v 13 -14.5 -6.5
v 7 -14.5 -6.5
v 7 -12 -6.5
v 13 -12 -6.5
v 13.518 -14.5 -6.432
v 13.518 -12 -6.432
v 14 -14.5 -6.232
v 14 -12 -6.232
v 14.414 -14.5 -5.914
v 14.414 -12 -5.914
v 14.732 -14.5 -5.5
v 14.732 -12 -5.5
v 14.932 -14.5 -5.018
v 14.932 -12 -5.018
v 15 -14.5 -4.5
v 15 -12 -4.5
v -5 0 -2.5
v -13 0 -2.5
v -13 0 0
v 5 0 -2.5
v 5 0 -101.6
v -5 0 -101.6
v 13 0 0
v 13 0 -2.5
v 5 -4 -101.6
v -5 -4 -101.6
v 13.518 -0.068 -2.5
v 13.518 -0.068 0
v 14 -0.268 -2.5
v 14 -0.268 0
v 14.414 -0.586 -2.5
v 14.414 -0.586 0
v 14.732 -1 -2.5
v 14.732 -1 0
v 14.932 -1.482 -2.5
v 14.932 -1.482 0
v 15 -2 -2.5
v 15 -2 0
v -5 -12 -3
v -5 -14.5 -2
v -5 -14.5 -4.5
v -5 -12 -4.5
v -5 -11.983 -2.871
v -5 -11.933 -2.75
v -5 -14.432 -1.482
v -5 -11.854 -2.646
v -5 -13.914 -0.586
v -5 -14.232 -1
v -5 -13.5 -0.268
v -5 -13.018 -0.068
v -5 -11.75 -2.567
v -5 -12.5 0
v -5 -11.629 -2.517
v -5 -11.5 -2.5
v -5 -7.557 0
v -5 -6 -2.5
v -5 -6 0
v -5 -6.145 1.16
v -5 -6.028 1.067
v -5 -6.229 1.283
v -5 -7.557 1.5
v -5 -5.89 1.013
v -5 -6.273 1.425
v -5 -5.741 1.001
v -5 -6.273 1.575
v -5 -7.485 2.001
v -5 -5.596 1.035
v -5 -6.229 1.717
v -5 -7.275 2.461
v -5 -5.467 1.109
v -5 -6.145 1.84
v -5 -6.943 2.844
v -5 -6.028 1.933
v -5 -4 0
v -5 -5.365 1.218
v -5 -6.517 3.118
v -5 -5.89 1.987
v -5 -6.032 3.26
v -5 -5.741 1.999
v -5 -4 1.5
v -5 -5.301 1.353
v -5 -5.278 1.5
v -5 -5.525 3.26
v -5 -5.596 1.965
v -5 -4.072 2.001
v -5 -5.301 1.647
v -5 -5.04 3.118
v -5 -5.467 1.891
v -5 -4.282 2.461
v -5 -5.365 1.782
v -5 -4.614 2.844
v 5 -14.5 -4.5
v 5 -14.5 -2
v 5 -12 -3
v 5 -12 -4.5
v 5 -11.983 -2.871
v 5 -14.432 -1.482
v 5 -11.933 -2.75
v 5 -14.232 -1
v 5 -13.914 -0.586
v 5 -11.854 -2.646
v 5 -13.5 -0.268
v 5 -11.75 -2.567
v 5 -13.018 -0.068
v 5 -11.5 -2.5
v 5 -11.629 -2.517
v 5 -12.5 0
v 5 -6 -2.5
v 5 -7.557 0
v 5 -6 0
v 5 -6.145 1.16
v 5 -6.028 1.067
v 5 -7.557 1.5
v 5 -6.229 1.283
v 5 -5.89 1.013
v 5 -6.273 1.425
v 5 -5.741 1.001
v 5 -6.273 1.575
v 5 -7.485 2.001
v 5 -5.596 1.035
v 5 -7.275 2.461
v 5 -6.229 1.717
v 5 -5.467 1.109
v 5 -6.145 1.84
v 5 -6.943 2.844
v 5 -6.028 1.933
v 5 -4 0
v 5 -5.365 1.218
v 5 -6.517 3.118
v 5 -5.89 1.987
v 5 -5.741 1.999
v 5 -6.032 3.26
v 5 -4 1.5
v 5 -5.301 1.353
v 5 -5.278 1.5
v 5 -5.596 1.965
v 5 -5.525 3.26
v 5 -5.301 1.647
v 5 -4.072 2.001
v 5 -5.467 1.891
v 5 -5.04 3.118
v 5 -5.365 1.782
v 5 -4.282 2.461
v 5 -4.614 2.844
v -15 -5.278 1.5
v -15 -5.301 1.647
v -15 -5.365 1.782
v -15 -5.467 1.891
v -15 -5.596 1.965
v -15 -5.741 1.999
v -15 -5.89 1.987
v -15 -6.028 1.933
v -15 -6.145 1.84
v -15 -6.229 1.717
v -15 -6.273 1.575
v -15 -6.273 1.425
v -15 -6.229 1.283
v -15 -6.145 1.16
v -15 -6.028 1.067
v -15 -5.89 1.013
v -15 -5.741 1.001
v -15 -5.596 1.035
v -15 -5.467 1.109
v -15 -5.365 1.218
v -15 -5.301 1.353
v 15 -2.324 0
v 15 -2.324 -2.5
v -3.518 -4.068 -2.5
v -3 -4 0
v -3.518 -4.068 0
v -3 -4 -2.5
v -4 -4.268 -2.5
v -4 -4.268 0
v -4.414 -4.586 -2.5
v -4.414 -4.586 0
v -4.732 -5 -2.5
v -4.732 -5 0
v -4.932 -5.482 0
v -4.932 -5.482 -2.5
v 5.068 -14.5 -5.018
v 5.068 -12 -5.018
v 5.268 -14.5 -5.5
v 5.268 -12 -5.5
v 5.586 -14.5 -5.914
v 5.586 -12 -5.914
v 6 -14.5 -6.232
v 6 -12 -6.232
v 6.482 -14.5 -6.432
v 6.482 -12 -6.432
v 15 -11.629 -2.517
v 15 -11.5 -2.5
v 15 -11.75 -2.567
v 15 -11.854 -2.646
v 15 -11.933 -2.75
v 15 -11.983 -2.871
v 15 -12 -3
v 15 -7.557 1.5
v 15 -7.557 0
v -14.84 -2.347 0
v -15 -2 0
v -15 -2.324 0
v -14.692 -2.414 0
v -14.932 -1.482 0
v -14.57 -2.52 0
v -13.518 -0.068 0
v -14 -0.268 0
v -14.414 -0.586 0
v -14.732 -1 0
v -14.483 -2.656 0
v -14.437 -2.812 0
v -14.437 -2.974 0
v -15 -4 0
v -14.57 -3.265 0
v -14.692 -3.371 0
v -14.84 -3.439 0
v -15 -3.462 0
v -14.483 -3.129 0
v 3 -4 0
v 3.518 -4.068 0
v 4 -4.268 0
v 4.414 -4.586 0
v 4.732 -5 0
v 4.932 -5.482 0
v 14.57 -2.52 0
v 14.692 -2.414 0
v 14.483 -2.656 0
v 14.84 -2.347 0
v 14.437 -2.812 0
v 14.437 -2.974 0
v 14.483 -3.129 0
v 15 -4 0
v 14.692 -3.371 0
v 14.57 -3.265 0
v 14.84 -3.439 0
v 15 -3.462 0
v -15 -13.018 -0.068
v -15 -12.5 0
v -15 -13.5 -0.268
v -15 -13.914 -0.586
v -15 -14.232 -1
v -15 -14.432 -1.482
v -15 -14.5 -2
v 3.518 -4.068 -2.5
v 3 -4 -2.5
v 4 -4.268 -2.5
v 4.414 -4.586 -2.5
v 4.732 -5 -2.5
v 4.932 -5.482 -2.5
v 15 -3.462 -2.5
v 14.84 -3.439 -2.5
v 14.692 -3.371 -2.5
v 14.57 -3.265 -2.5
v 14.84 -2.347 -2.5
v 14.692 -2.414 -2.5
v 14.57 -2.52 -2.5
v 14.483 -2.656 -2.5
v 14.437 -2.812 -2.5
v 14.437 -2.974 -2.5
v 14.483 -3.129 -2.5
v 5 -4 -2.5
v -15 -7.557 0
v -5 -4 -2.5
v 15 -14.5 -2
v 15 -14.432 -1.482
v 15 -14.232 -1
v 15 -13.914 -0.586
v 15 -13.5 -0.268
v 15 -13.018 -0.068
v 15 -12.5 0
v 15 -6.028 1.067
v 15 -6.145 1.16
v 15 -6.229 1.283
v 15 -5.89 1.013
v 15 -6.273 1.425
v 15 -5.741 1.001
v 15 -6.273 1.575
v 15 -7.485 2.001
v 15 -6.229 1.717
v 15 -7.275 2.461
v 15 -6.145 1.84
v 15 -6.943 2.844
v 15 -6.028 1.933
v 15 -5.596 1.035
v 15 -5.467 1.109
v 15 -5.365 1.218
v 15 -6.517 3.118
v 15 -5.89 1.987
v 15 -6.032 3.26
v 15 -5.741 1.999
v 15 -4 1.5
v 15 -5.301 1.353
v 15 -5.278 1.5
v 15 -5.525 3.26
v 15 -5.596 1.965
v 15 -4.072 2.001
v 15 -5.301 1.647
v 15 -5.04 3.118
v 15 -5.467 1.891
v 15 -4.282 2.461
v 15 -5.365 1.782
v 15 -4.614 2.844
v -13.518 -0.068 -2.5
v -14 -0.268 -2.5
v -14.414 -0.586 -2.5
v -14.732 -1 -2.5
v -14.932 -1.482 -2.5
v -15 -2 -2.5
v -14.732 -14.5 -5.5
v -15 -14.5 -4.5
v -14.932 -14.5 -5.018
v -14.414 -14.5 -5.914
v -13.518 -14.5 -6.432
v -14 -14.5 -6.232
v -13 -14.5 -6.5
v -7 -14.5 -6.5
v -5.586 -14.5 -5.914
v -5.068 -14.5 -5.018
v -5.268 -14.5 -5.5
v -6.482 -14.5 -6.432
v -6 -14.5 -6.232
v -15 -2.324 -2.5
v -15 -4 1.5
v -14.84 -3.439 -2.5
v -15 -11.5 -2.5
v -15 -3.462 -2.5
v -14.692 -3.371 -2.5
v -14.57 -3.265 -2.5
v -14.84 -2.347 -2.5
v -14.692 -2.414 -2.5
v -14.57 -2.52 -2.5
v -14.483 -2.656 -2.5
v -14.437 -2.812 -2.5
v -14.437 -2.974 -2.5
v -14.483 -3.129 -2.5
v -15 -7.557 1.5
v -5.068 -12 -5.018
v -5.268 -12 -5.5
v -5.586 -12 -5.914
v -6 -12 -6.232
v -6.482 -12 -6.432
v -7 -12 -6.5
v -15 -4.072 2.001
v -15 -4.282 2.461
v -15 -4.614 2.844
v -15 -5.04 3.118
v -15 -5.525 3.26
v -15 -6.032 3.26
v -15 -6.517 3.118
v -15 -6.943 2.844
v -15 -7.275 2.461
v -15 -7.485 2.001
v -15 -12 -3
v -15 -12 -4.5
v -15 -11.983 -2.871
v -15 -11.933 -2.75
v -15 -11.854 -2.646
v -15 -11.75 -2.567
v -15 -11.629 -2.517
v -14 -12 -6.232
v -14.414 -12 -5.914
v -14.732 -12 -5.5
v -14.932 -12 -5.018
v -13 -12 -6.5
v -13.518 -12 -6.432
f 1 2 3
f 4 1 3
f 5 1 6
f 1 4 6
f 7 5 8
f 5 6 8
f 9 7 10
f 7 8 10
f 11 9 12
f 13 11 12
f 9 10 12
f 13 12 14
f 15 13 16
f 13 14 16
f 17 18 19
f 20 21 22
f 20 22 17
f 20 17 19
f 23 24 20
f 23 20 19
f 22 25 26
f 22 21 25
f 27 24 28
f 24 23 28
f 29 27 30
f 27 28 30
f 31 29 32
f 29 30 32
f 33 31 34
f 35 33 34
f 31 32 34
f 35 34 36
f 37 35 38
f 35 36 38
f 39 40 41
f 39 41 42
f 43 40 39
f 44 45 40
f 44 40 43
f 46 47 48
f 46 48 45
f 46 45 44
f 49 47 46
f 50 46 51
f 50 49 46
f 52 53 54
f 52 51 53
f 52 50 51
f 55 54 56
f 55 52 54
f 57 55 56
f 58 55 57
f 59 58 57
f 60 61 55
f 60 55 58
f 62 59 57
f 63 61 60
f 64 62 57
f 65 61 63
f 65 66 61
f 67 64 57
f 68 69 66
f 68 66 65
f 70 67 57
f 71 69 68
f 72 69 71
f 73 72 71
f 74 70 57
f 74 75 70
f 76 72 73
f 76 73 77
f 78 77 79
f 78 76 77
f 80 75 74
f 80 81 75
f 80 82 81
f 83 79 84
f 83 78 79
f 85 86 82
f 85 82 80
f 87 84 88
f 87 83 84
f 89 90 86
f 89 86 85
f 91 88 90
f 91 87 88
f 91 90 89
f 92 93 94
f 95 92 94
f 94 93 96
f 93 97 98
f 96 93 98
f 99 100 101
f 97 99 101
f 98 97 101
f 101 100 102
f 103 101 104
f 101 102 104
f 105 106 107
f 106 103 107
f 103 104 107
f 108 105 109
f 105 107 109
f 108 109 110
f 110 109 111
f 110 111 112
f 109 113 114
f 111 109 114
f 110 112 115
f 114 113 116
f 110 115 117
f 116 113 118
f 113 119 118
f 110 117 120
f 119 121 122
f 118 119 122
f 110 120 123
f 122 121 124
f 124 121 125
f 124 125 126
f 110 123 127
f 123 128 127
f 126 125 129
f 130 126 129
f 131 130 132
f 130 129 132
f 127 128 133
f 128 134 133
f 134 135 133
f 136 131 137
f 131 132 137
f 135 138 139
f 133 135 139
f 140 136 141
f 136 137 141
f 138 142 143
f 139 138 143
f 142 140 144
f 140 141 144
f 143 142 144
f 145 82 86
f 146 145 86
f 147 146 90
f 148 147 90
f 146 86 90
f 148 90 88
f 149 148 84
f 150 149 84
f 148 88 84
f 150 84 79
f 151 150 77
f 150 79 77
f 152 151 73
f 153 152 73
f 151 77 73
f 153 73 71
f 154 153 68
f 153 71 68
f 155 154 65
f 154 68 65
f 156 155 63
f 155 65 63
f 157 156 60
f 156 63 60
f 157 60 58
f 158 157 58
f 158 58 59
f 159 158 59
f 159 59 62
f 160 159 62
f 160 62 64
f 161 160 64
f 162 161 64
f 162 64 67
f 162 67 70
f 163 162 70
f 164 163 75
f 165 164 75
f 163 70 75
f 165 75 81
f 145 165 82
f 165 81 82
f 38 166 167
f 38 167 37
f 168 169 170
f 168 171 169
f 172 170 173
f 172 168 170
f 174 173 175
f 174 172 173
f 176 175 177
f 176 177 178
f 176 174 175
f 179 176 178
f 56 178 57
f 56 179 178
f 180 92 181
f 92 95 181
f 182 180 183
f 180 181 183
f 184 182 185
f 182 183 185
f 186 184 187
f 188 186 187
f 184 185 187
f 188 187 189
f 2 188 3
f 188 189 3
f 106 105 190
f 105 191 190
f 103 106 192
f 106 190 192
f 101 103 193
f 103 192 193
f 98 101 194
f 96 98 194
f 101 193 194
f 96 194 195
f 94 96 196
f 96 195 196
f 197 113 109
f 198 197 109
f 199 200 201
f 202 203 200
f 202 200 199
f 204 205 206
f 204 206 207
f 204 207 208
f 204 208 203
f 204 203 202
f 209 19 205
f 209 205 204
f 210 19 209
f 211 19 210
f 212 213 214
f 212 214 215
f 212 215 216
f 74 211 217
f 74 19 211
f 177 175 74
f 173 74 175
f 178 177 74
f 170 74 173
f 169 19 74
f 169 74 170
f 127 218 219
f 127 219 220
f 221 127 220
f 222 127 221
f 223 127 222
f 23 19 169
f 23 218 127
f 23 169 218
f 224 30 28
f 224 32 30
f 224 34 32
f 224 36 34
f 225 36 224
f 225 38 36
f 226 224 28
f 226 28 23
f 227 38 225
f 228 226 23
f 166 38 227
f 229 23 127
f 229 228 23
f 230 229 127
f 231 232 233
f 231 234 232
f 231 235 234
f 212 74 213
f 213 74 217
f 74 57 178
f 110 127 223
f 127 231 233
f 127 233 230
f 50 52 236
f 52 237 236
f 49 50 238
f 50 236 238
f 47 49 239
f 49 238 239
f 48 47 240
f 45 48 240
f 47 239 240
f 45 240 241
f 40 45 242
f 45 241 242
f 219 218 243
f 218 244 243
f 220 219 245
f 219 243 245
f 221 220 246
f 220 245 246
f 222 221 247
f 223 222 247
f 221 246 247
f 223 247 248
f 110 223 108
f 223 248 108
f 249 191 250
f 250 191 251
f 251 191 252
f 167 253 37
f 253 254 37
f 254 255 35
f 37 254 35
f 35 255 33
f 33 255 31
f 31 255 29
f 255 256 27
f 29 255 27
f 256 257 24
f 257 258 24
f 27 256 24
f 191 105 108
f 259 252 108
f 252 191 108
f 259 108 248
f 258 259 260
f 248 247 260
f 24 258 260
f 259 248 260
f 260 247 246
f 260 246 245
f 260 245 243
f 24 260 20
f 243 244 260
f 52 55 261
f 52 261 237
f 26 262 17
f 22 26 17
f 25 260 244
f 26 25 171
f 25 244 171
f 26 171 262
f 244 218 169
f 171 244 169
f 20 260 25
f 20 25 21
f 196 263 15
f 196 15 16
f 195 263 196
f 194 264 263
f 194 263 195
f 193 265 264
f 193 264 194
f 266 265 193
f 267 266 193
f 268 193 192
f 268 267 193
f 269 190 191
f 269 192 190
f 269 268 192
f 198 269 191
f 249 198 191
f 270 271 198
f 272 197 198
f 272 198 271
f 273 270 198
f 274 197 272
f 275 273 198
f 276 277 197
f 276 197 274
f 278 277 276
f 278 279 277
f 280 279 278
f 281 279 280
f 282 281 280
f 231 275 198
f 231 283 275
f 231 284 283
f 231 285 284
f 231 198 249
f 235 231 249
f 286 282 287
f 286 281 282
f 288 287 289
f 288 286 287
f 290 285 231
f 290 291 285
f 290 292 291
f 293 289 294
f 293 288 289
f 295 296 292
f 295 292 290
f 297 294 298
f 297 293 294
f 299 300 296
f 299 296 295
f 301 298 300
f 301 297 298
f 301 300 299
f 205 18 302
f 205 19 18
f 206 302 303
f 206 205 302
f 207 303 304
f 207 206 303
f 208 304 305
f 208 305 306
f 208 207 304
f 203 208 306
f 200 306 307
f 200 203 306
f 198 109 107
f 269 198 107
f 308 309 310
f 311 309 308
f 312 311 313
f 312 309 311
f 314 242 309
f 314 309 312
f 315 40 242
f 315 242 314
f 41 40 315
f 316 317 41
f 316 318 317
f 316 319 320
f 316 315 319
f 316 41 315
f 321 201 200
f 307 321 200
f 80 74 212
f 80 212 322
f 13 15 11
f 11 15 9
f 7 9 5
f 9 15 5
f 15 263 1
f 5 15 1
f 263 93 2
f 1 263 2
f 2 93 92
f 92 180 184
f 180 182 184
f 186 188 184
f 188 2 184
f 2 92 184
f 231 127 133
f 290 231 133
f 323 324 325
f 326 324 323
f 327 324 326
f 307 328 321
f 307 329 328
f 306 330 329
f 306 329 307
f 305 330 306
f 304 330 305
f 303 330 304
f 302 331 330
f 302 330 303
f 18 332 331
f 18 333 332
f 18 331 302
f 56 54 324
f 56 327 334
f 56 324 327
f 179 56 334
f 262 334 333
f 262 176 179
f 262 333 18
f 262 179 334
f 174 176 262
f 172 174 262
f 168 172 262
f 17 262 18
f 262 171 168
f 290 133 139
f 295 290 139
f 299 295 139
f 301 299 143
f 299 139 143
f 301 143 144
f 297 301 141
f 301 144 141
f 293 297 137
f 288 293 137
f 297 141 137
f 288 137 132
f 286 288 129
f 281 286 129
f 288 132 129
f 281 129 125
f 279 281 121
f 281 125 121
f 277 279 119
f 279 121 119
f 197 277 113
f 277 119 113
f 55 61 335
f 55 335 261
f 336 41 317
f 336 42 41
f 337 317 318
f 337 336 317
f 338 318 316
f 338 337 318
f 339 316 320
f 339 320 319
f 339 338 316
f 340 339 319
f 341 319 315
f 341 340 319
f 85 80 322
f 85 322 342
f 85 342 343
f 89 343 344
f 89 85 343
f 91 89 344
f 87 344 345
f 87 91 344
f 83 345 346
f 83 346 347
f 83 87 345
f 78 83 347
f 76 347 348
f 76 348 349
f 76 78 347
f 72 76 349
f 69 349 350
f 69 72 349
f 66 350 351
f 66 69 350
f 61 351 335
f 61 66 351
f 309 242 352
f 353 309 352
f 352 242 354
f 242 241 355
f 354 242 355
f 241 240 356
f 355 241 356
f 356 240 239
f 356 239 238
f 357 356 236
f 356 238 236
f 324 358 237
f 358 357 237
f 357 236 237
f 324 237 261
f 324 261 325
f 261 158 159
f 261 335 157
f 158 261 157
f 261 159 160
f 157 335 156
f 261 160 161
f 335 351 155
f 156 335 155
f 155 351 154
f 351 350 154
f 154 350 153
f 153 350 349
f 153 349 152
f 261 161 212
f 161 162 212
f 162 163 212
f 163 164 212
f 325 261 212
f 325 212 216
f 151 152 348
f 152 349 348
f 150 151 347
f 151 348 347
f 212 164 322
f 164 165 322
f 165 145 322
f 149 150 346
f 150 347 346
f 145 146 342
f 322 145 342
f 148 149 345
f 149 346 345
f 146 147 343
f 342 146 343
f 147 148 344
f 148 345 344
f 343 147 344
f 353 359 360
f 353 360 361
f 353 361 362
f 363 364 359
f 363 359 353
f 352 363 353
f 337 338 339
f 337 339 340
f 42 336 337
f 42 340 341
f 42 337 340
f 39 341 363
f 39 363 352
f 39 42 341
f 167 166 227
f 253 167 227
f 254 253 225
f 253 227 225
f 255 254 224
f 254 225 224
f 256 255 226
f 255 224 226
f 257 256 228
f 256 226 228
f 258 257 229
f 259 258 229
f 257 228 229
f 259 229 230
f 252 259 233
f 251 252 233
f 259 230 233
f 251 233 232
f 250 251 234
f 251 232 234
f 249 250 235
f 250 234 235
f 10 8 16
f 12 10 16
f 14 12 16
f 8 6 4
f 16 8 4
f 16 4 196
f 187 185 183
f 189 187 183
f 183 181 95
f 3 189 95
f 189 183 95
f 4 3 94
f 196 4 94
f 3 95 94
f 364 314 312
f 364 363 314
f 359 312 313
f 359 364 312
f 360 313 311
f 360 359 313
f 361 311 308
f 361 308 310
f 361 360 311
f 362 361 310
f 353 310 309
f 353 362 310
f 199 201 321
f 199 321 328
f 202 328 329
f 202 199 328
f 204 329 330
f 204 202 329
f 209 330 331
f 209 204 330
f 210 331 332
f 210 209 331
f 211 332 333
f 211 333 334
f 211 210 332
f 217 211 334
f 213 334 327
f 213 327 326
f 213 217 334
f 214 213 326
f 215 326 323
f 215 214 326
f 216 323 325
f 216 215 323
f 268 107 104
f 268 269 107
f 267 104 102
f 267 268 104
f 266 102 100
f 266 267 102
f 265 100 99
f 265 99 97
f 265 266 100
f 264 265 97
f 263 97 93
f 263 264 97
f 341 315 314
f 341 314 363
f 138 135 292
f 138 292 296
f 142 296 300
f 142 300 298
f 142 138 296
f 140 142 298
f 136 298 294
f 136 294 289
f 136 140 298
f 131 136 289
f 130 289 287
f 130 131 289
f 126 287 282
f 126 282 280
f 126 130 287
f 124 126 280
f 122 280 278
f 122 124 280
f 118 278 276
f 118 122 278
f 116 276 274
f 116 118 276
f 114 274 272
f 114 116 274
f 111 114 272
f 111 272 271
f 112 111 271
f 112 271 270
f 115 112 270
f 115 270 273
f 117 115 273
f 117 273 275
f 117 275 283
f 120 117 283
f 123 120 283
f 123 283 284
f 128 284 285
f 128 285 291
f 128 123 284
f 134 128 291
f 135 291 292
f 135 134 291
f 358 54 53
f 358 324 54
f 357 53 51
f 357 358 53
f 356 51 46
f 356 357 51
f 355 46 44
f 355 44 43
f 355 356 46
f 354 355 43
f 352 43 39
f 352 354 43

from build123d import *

# Parameters (mm, degrees)
F0_W     = 5
F0_H     = 4
F1_DEPTH = 101.6
F2_R     = 0.5
F3_DEPTH = 10
F4_R     = 2
F5_R     = 0.5
F7_DEPTH = 101.601


with BuildPart() as f1:
    # F0 (on Top) → F1 (new body)
    with BuildSketch(Plane.XY):
        with Locations((2.5, -2)):
            Rectangle(F0_W, F0_H)
    extrude(amount=-F1_DEPTH)

    # F2 (on face) → F3 (join)
    with BuildSketch(Plane.YZ.offset(5)):
        with BuildLine():
            Line((0, -2.5), (0, 0))
            Line((0, 0), (-4, 0))
            Line((-4, 0), (-4, 1.5))
            ThreePointArc((-4, 1.5), (-5.7784285378, 3.2784285378), (-7.5568570755, 1.5))
            Line((-7.5568570755, 1.5), (-7.5568570755, 0))
            Line((-7.5568570755, 0), (-14.5, 0))
            Line((-14.5, 0), (-14.5, -6.5))
            Line((-14.5, -6.5), (-12, -6.5))
            Line((-12, -6.5), (-12, -2.5))
            Line((-12, -2.5), (0, -2.5))
        make_face()
        with Locations((-5.7784285378, 1.5)):
            Circle(F2_R, mode=Mode.SUBTRACT)
    extrude(amount=F3_DEPTH)

    # F4
    f4_edges = [f1.edges().sort_by_distance(p)[0] for p in [
        (10, -14.5, 0),
        (5, -4, -1.25),
        (15, 0, -1.25),
        (15, -13.25, -6.5),
        (5, -13.25, -6.5),
    ]]
    fillet(f4_edges, radius=F4_R)

    # F5
    f5_edges = [f1.edges().sort_by_distance(p)[0] for p in [
        (10, -12, -2.5),
    ]]
    fillet(f5_edges, radius=F5_R)

    # F6 (on face) → F7 (cut, through all)
    with BuildSketch(Plane.XY):
        with BuildLine():
            Line((15, -3.4615779296), (15, -2.3238305002))
            ThreePointArc((15, -2.3238305002), (14.4311262853, -2.8927042149), (15, -3.4615779296))
        make_face()
    extrude(amount=-F7_DEPTH, mode=Mode.SUBTRACT)

    # F8: F1 across plane


with BuildPart() as f1_1:
    add(f1.part)
    add(f1.part.mirror(Plane.YZ))


solid = f1_1.part
